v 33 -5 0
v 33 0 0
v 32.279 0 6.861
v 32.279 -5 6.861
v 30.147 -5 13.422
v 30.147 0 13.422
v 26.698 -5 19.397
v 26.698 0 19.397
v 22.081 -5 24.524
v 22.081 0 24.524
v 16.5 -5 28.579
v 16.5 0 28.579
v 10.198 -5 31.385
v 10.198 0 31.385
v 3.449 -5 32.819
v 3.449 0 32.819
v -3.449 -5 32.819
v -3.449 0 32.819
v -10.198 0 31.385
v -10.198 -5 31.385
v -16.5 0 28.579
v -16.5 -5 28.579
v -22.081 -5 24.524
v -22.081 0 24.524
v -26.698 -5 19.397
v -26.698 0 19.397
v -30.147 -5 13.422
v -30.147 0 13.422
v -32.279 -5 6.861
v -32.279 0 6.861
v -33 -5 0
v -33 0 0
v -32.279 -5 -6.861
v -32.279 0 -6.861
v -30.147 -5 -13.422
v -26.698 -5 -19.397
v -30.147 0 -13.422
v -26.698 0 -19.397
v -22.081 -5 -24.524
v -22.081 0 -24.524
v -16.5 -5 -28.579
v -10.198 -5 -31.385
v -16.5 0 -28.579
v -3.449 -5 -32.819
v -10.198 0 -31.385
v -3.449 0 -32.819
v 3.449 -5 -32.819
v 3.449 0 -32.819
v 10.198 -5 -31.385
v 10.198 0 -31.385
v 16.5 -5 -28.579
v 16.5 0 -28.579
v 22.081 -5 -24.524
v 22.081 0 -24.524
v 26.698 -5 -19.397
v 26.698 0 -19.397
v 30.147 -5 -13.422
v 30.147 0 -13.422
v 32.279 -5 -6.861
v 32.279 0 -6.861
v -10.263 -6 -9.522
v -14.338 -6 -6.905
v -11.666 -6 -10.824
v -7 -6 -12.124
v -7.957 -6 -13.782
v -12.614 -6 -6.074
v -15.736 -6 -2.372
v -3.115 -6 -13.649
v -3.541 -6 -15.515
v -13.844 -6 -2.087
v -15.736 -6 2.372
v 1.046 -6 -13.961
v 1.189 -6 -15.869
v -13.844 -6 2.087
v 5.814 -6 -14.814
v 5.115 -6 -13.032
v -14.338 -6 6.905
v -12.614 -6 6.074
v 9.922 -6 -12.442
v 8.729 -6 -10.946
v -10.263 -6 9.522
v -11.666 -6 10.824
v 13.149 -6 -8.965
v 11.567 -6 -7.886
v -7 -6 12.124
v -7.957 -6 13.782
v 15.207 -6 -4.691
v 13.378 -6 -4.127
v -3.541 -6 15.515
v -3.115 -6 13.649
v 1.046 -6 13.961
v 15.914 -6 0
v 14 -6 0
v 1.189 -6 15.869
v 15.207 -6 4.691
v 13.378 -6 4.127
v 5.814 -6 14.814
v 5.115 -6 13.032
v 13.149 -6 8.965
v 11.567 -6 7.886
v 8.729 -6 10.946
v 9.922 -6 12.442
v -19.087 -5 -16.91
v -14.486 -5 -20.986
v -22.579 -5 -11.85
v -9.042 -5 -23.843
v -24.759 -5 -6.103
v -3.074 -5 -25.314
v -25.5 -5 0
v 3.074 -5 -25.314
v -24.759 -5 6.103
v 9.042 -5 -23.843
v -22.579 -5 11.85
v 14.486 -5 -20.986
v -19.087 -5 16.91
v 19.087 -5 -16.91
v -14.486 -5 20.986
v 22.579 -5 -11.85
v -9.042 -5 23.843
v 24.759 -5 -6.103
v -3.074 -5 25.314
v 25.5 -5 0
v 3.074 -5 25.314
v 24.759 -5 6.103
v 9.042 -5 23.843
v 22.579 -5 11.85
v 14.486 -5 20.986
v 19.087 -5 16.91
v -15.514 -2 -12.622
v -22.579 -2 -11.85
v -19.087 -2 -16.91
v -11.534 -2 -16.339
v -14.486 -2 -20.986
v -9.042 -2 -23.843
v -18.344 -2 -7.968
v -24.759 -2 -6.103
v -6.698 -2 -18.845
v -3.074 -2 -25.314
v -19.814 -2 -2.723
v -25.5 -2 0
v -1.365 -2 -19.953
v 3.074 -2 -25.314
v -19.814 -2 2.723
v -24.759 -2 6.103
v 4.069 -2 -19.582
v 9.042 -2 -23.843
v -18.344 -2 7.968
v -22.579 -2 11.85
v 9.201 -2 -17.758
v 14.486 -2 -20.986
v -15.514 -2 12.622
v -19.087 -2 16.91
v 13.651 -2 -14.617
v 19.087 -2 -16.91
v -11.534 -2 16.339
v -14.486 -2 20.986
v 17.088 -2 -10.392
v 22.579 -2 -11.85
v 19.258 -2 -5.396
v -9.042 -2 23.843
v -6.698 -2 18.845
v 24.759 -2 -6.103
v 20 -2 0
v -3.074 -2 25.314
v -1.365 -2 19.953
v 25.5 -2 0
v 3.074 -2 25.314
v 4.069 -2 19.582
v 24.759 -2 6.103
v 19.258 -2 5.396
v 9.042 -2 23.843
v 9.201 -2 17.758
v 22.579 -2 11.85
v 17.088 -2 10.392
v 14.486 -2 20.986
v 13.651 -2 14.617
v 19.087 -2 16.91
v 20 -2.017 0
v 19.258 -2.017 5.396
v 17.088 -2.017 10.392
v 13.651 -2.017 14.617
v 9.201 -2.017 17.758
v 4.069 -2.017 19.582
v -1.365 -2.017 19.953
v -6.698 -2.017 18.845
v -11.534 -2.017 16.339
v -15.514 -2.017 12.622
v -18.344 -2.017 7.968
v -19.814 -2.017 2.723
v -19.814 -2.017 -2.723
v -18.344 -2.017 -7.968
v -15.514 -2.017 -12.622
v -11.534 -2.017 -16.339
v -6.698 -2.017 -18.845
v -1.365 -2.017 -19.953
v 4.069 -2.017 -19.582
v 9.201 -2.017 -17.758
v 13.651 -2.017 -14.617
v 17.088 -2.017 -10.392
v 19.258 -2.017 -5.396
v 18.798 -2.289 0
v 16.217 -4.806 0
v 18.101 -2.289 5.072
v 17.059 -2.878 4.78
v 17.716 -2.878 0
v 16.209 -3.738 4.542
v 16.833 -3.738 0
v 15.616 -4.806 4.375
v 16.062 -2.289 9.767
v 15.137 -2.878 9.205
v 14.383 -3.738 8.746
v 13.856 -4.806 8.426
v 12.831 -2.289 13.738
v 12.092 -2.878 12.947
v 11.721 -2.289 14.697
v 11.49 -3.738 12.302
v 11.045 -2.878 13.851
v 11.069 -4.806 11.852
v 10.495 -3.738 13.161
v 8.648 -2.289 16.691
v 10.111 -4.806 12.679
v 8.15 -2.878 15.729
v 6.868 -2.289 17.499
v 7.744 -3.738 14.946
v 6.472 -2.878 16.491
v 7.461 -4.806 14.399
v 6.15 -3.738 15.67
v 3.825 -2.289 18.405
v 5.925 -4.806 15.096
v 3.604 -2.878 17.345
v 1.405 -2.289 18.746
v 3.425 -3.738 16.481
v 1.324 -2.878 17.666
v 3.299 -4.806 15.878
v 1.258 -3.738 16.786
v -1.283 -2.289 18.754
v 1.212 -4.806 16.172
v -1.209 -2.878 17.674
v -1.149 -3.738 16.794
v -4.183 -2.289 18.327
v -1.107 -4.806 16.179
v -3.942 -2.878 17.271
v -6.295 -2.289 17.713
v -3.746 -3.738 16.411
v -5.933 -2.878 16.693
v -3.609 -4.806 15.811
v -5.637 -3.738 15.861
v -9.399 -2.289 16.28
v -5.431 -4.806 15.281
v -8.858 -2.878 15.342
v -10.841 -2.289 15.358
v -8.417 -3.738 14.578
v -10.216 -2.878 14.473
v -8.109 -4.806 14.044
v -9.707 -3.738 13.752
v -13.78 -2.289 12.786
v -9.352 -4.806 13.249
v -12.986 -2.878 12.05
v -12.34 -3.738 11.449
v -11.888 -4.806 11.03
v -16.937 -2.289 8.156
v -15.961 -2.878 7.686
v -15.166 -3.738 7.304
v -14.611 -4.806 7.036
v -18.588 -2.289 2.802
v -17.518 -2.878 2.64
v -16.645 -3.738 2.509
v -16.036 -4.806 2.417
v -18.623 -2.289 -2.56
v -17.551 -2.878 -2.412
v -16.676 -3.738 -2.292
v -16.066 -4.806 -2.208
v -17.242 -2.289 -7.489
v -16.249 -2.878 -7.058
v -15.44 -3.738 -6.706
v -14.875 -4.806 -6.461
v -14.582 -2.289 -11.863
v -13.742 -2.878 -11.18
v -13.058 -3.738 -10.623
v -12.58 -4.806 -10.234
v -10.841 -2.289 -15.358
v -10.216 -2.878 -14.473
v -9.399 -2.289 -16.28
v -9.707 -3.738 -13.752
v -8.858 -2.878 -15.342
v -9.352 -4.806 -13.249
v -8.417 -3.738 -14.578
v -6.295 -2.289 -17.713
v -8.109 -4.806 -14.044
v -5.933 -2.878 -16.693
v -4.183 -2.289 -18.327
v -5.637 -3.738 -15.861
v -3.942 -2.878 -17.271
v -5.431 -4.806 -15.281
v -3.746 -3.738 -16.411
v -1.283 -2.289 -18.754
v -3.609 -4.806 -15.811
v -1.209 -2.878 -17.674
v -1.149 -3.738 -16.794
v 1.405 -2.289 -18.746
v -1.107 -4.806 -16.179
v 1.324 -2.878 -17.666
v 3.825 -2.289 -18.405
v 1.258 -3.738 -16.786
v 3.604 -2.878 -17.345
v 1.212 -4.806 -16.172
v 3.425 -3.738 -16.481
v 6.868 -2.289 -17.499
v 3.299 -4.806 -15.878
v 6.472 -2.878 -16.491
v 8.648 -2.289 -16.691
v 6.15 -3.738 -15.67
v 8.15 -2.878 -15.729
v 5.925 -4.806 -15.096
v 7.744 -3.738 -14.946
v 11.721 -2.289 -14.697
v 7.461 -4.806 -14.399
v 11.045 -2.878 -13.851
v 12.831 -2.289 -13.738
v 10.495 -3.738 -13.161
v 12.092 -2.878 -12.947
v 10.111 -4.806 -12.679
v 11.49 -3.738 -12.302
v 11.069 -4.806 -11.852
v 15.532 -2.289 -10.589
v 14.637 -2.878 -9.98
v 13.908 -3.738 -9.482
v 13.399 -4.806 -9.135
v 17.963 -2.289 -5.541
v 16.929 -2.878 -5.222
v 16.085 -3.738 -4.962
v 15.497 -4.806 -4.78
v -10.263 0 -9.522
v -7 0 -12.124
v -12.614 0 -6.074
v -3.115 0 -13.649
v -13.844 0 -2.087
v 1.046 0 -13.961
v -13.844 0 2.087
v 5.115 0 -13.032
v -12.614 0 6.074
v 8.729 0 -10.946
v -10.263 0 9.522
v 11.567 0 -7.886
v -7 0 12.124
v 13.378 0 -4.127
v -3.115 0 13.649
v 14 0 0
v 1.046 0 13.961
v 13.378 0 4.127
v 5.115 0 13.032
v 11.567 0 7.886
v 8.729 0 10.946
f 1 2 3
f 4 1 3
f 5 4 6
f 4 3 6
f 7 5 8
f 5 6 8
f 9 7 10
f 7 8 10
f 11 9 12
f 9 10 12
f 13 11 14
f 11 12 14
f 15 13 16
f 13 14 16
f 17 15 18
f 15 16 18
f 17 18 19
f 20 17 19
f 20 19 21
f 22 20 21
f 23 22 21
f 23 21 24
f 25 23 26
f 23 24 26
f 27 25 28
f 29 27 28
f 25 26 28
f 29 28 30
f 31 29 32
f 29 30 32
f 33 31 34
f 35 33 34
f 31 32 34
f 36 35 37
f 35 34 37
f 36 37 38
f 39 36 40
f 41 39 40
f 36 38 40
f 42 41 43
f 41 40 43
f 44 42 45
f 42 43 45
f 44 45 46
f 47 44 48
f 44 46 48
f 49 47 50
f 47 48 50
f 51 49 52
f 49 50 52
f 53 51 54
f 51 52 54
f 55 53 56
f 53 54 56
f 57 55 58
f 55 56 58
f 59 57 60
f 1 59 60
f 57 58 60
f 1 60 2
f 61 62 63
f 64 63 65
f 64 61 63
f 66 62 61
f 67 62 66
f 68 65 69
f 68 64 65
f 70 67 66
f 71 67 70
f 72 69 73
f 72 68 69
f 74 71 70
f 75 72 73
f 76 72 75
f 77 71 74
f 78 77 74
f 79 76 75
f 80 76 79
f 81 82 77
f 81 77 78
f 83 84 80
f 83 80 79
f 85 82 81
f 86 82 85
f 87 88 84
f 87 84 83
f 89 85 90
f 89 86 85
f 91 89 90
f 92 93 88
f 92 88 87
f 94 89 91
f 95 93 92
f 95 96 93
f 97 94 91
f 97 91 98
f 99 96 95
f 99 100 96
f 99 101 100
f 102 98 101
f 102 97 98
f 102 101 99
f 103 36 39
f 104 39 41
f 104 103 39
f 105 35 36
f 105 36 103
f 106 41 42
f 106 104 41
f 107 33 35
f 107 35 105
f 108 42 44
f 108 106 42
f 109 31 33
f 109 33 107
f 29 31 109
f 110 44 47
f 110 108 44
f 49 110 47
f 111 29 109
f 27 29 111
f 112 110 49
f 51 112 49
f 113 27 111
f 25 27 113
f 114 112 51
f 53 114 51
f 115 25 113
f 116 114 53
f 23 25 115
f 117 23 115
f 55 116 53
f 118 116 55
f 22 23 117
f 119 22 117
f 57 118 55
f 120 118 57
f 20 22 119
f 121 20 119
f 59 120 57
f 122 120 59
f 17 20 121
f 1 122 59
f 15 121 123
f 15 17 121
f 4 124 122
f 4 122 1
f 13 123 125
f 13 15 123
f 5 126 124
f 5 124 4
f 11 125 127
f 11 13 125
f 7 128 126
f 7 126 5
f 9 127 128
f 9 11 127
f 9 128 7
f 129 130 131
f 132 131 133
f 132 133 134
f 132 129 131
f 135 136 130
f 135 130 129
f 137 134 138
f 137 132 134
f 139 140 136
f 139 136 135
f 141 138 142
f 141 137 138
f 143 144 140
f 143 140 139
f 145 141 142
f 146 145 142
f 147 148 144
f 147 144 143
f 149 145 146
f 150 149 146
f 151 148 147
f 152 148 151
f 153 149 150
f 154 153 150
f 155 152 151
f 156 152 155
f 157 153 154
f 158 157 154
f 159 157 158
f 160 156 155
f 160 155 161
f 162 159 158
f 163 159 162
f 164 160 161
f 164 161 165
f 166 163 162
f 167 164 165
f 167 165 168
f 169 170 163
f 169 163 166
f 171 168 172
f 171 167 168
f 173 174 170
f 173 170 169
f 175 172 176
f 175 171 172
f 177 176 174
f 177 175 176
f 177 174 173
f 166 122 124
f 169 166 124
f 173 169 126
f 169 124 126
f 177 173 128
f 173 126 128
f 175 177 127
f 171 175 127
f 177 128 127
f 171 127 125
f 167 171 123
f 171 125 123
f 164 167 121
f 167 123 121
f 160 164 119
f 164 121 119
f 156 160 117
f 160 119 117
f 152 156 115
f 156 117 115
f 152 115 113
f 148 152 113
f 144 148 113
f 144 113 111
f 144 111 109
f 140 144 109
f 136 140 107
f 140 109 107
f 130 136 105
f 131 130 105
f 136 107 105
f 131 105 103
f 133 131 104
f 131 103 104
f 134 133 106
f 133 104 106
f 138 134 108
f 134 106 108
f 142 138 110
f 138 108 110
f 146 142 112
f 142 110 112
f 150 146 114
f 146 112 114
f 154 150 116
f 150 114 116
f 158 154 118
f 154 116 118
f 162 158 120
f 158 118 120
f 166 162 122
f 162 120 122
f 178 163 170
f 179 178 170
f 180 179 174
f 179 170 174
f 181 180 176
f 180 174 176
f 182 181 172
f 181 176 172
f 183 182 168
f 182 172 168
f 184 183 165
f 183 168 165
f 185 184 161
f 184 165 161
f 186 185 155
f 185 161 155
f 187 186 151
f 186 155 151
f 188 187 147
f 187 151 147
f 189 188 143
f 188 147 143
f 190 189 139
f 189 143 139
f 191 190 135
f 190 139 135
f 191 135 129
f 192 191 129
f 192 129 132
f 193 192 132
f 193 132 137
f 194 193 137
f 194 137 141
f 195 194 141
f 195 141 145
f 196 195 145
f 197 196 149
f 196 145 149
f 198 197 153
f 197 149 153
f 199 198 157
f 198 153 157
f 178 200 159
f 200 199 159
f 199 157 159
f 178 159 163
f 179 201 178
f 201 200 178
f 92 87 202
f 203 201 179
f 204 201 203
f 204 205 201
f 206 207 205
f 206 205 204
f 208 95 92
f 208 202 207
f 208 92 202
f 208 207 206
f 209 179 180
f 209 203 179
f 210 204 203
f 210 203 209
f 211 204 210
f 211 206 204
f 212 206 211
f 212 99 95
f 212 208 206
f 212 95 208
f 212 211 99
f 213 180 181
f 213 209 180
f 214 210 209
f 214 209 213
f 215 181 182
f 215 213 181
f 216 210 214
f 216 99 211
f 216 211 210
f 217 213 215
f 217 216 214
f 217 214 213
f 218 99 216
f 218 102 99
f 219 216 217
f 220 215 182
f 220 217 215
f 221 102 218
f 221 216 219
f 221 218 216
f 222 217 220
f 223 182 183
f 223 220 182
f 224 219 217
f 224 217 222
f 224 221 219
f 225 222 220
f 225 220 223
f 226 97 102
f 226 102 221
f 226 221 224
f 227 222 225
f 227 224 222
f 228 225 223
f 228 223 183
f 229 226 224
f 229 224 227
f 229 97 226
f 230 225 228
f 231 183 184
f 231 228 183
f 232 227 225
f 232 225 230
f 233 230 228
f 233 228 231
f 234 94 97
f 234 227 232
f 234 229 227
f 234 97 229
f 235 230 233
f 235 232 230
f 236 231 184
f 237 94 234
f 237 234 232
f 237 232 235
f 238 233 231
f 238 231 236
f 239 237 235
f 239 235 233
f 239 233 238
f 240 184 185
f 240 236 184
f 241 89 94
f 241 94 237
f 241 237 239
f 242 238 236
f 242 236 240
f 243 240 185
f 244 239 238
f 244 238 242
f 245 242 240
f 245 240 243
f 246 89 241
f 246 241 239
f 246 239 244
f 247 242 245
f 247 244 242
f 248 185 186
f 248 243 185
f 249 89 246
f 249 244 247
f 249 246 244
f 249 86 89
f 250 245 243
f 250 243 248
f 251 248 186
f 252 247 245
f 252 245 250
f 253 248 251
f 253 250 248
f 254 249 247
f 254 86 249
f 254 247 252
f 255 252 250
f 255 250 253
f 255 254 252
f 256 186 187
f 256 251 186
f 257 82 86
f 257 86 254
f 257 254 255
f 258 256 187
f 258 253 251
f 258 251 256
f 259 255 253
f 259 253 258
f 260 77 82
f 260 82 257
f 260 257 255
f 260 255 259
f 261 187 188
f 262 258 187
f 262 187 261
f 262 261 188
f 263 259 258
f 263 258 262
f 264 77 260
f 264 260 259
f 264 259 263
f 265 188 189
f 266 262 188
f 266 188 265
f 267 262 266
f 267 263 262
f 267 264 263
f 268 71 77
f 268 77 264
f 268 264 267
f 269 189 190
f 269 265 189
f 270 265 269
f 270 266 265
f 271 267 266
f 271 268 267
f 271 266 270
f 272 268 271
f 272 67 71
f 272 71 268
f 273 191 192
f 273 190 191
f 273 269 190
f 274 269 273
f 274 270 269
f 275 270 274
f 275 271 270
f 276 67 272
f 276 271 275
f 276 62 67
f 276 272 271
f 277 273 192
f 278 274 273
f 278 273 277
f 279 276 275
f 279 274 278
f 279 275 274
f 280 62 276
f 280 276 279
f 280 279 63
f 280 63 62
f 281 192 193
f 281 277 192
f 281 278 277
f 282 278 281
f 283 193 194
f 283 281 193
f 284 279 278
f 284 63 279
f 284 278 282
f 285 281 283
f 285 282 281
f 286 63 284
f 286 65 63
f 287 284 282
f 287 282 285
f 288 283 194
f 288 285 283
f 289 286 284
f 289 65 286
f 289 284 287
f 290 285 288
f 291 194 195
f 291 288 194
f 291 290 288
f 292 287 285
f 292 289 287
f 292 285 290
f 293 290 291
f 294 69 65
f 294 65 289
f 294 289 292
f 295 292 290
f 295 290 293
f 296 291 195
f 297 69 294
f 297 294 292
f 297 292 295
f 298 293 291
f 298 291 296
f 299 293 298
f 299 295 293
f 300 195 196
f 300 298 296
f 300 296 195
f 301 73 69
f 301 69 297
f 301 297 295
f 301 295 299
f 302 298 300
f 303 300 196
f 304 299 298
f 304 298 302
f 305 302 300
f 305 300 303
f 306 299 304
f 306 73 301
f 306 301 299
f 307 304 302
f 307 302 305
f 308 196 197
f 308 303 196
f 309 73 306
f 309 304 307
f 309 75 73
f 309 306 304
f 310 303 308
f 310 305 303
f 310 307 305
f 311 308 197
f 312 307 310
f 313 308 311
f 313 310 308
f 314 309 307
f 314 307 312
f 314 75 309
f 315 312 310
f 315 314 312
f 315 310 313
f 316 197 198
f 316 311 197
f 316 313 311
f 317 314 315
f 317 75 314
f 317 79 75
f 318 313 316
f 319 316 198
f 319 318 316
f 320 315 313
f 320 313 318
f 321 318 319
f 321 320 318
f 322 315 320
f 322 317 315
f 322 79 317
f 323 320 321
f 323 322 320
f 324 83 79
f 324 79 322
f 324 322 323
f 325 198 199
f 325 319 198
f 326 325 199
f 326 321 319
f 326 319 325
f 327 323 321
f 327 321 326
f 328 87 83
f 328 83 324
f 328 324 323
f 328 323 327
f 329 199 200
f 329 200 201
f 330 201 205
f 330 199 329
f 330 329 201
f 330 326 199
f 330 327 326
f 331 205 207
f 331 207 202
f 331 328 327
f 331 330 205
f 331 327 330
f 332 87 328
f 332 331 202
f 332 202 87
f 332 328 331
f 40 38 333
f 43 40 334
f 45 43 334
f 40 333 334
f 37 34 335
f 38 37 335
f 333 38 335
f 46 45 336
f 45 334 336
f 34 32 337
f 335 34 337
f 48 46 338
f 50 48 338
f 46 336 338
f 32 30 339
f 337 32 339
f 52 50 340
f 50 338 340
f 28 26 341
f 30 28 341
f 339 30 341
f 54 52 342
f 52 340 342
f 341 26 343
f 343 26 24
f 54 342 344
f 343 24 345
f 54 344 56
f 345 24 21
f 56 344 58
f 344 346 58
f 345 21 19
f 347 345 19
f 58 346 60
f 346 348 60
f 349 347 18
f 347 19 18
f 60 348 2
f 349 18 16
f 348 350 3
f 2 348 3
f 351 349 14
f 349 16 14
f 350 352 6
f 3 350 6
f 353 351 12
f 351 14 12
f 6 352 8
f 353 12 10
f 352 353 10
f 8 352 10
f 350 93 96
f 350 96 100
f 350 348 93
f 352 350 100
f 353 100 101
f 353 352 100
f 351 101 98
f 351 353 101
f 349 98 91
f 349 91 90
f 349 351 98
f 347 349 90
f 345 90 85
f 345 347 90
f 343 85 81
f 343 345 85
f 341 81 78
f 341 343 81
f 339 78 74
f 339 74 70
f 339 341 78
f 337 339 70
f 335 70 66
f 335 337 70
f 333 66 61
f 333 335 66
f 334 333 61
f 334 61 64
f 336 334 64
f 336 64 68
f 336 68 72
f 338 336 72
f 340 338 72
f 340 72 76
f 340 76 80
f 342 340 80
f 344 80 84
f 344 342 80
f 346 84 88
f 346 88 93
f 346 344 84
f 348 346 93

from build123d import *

# Parameters (mm, degrees)
F0_R     = 33
F0_R_2   = 14
F1_DEPTH = 5
F2_R     = 25.5
F2_R_2   = 14
F3_DEPTH = 3
F4_R     = 20
F4_R_2   = 14
F5_DEPTH = 4


with BuildPart() as f1:
    # F0 (on Front) → F1 (new body)
    with BuildSketch(Plane.XZ):
        Circle(F0_R)
        Circle(F0_R_2, mode=Mode.SUBTRACT)
    extrude(amount=F1_DEPTH)

    # F2 (on face) → F3 (cut)
    with BuildSketch(Plane.XZ.offset(5)):
        Circle(F2_R)
        Circle(F2_R_2, mode=Mode.SUBTRACT)
    extrude(amount=-F3_DEPTH, mode=Mode.SUBTRACT)

    # F4 (on face) → F5 (join)
    with BuildSketch(Plane.XZ.offset(2)):
        Circle(F4_R)
        Circle(F4_R_2, mode=Mode.SUBTRACT)
    extrude(amount=F5_DEPTH)

    # F6 (on Top) → F7 (revolve, cut)
    with BuildSketch(Plane.XY):
        with BuildLine():
            ThreePointArc((20.3859657049, -2), (17.2039851896, -9.6819805153), (24.8859657049, -6.5))
            ThreePointArc((24.8859657049, -6.5), (23.5679462203, -3.3180194847), (20.3859657049, -2))
        make_face()
    revolve(axis=Axis((0, -6, 0), (0, -1, 0)), mode=Mode.SUBTRACT)


solid = f1.part
